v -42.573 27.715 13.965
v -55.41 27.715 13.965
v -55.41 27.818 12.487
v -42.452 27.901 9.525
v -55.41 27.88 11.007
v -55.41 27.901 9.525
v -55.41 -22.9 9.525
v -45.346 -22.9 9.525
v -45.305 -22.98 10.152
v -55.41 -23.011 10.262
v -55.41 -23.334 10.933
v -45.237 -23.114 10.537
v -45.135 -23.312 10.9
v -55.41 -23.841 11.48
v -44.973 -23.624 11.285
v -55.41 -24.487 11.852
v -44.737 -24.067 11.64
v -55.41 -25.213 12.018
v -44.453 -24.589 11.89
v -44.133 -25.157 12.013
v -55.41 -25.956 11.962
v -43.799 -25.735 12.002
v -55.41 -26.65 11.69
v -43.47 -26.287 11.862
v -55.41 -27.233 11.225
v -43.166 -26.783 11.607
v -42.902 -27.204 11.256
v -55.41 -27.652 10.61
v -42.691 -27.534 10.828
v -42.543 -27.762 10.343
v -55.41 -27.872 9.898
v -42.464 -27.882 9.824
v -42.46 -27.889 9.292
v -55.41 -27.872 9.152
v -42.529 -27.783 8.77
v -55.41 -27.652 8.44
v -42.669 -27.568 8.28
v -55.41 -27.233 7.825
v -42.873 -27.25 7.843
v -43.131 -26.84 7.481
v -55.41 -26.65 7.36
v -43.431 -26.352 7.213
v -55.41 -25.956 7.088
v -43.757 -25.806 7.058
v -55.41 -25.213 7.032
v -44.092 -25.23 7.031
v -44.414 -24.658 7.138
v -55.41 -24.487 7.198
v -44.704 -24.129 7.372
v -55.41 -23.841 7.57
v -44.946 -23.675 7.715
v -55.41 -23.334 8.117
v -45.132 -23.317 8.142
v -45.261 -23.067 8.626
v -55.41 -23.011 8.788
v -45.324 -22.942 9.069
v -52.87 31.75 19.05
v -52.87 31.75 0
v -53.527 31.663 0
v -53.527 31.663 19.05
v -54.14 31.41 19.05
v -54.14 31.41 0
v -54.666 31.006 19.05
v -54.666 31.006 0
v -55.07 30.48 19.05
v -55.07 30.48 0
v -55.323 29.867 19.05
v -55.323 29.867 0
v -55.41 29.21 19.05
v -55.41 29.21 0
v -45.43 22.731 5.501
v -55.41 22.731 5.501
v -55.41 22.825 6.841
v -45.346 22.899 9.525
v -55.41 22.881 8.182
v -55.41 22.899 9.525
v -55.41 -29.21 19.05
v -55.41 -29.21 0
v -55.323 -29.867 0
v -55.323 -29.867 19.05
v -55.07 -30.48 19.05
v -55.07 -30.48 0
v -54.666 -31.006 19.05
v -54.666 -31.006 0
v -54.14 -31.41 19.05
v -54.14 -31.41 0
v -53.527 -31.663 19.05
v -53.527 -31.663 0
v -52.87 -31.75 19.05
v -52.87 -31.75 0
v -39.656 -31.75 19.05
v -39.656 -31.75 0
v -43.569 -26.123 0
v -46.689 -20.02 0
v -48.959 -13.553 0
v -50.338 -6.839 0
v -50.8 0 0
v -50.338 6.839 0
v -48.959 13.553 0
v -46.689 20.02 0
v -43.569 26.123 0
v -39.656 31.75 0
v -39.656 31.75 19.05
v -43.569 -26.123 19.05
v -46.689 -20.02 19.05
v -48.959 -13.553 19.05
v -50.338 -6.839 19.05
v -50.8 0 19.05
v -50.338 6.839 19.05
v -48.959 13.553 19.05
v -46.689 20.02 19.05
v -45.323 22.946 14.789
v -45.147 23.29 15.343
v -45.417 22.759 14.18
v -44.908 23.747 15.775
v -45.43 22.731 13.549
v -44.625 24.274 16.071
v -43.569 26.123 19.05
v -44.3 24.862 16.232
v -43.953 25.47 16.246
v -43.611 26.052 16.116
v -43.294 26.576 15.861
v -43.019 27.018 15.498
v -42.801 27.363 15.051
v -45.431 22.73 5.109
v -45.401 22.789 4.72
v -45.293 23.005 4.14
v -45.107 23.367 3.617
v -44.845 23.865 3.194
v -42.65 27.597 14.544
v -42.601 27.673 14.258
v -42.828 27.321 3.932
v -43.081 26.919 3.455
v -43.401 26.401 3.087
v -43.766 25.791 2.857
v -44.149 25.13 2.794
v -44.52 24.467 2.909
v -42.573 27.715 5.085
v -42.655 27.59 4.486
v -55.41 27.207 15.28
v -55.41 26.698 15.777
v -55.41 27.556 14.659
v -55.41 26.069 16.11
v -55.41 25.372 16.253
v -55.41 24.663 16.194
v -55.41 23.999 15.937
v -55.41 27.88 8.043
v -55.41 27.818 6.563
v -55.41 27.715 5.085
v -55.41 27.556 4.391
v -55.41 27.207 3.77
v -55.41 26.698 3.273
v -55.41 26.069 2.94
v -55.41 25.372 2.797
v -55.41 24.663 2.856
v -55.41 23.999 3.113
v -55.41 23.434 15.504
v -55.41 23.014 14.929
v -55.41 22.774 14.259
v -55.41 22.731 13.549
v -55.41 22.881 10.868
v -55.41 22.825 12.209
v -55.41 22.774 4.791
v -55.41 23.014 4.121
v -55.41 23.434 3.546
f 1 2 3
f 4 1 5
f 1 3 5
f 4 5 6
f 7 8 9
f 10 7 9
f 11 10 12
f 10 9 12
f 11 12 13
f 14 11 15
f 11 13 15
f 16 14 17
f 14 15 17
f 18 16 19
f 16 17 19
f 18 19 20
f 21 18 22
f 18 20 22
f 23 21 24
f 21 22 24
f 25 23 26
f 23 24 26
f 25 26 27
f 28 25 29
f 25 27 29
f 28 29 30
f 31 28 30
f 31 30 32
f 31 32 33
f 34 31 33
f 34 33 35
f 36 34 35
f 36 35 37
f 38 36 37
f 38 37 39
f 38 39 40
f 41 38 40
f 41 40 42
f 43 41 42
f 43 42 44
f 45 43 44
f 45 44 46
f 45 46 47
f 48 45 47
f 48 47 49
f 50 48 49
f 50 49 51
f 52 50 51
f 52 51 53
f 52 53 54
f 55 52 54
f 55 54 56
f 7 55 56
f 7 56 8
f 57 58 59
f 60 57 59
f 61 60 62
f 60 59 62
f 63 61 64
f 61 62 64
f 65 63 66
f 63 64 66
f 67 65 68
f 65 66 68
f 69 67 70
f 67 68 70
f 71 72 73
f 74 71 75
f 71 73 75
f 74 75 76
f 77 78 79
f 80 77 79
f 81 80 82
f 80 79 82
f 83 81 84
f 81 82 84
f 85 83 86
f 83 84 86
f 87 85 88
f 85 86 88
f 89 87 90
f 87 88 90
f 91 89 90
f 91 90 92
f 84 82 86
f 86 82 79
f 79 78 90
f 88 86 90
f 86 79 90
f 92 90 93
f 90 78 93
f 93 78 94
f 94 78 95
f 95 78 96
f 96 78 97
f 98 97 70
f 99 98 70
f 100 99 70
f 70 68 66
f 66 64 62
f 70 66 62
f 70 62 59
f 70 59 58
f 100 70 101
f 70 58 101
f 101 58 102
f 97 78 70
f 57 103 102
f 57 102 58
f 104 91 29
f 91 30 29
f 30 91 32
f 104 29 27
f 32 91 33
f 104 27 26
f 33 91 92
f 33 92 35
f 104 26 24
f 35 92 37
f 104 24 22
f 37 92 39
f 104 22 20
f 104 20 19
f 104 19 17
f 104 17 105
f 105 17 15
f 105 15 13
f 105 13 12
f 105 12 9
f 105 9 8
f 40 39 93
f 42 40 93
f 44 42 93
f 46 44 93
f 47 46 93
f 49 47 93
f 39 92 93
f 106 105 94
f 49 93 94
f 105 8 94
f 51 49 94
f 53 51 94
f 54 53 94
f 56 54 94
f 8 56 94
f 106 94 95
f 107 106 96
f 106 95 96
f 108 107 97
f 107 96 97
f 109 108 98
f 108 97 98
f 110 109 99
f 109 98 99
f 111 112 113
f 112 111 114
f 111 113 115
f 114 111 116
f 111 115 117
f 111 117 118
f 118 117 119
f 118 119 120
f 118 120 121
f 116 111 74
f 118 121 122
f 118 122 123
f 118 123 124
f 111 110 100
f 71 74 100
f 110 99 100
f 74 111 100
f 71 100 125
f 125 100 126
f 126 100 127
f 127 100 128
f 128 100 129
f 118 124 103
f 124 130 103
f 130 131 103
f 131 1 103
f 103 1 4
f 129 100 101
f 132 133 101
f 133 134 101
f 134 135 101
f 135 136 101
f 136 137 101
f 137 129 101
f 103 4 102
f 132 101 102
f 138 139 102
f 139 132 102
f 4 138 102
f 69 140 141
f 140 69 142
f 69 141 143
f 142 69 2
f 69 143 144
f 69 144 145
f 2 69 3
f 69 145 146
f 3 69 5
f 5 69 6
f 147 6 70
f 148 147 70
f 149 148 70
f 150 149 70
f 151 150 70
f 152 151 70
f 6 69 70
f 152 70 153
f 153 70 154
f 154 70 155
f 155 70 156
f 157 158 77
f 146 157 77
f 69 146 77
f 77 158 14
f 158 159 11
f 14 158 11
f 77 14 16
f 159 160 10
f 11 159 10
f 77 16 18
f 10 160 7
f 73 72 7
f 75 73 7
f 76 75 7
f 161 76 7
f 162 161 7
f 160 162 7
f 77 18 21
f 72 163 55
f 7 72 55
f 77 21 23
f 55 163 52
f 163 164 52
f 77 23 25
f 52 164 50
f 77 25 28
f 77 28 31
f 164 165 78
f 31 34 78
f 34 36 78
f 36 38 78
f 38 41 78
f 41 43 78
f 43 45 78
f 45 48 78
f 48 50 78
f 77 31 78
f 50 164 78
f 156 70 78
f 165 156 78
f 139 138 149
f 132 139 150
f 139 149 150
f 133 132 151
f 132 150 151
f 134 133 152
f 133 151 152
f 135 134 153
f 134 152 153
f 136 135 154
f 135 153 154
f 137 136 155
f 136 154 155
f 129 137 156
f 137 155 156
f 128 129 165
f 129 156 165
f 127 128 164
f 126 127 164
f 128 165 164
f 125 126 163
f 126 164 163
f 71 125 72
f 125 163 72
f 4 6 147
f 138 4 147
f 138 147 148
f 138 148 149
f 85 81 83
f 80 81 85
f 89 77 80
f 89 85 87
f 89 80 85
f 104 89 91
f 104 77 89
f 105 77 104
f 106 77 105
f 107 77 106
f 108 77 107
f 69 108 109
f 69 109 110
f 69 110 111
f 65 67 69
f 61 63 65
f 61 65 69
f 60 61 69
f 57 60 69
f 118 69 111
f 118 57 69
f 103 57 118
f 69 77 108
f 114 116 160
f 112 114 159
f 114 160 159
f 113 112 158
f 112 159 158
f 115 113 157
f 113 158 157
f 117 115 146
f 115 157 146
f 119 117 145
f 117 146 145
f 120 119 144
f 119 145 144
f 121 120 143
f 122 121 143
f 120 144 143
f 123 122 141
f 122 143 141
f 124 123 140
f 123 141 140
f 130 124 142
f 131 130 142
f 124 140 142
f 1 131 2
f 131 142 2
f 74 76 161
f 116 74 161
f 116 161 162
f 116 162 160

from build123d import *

# Parameters (mm, degrees)
F1_DEPTH = 19.05
F4_D     = 5
F4_DEPTH = 15.7
F4_TIP   = 1.5021515476
F5_DEPTH = 25.4


with BuildPart() as f1:
    # F0 (on Top) → F1 (new body)
    with BuildSketch(Plane.XY):
        with BuildLine():
            ThreePointArc((-39.6557372898, -31.75), (-50.8, 0), (-39.6557372898, 31.75))
            Line((-39.6557372898, 31.75), (-52.8699082947, 31.75))
            ThreePointArc((-52.8699082947, 31.75), (-54.6659595189, 31.0060512242), (-55.4099082947, 29.21))
            Line((-55.4099082947, 29.21), (-55.4099082947, -29.21))
            ThreePointArc((-55.4099082947, -29.21), (-54.6659595189, -31.0060512242), (-52.8699082947, -31.75))
            Line((-52.8699082947, -31.75), (-39.6557372898, -31.75))
        make_face()
    extrude(amount=F1_DEPTH)

    # F4
    with Locations(Plane(origin=(-55.4099082947, 0, 0), x_dir=(0, -1, 0), z_dir=(-1, 0, 0))):
        with Locations((25.4, 9.525)):
            Hole(F4_D / 2, depth=F4_DEPTH)
            with Locations((0, 0, -(F4_DEPTH + F4_TIP / 2))):  # 118° drill point
                Cone(0, F4_D / 2, F4_TIP, mode=Mode.SUBTRACT)

    # F3 (on offset) → F5 (cut)
    with BuildSketch(Plane(origin=(-55.4099082947, 0, 0), x_dir=(0, -1, 0), z_dir=(-1, 0, 0))):
        with BuildLine():
            ThreePointArc((-27.7153407028, 13.9654662391), (-27.8542875294, 11.747165191), (-27.90063, 9.525))
            Line((-27.90063, 9.525), (-22.89937, 9.525))
            ThreePointArc((-22.89937, 9.525), (-22.8573758972, 11.538656851), (-22.7314666127, 13.5488121361))
            ThreePointArc((-22.7314666127, 13.5488121361), (-25.0150766063, 16.2490762326), (-27.7153407028, 13.9654662391))
        make_face()
        with BuildLine():
            Line((-22.89937, 9.525), (-27.90063, 9.525))
            ThreePointArc((-27.90063, 9.525), (-27.8542875294, 7.302834809), (-27.7153407028, 5.0845337609))
            ThreePointArc((-27.7153407028, 5.0845337609), (-25.0150766063, 2.8009237674), (-22.7314666127, 5.5011878639))
            ThreePointArc((-22.7314666127, 5.5011878639), (-22.8573758972, 7.511343149), (-22.89937, 9.525))
        make_face()
    extrude(amount=-F5_DEPTH, mode=Mode.SUBTRACT)


solid = f1.part
